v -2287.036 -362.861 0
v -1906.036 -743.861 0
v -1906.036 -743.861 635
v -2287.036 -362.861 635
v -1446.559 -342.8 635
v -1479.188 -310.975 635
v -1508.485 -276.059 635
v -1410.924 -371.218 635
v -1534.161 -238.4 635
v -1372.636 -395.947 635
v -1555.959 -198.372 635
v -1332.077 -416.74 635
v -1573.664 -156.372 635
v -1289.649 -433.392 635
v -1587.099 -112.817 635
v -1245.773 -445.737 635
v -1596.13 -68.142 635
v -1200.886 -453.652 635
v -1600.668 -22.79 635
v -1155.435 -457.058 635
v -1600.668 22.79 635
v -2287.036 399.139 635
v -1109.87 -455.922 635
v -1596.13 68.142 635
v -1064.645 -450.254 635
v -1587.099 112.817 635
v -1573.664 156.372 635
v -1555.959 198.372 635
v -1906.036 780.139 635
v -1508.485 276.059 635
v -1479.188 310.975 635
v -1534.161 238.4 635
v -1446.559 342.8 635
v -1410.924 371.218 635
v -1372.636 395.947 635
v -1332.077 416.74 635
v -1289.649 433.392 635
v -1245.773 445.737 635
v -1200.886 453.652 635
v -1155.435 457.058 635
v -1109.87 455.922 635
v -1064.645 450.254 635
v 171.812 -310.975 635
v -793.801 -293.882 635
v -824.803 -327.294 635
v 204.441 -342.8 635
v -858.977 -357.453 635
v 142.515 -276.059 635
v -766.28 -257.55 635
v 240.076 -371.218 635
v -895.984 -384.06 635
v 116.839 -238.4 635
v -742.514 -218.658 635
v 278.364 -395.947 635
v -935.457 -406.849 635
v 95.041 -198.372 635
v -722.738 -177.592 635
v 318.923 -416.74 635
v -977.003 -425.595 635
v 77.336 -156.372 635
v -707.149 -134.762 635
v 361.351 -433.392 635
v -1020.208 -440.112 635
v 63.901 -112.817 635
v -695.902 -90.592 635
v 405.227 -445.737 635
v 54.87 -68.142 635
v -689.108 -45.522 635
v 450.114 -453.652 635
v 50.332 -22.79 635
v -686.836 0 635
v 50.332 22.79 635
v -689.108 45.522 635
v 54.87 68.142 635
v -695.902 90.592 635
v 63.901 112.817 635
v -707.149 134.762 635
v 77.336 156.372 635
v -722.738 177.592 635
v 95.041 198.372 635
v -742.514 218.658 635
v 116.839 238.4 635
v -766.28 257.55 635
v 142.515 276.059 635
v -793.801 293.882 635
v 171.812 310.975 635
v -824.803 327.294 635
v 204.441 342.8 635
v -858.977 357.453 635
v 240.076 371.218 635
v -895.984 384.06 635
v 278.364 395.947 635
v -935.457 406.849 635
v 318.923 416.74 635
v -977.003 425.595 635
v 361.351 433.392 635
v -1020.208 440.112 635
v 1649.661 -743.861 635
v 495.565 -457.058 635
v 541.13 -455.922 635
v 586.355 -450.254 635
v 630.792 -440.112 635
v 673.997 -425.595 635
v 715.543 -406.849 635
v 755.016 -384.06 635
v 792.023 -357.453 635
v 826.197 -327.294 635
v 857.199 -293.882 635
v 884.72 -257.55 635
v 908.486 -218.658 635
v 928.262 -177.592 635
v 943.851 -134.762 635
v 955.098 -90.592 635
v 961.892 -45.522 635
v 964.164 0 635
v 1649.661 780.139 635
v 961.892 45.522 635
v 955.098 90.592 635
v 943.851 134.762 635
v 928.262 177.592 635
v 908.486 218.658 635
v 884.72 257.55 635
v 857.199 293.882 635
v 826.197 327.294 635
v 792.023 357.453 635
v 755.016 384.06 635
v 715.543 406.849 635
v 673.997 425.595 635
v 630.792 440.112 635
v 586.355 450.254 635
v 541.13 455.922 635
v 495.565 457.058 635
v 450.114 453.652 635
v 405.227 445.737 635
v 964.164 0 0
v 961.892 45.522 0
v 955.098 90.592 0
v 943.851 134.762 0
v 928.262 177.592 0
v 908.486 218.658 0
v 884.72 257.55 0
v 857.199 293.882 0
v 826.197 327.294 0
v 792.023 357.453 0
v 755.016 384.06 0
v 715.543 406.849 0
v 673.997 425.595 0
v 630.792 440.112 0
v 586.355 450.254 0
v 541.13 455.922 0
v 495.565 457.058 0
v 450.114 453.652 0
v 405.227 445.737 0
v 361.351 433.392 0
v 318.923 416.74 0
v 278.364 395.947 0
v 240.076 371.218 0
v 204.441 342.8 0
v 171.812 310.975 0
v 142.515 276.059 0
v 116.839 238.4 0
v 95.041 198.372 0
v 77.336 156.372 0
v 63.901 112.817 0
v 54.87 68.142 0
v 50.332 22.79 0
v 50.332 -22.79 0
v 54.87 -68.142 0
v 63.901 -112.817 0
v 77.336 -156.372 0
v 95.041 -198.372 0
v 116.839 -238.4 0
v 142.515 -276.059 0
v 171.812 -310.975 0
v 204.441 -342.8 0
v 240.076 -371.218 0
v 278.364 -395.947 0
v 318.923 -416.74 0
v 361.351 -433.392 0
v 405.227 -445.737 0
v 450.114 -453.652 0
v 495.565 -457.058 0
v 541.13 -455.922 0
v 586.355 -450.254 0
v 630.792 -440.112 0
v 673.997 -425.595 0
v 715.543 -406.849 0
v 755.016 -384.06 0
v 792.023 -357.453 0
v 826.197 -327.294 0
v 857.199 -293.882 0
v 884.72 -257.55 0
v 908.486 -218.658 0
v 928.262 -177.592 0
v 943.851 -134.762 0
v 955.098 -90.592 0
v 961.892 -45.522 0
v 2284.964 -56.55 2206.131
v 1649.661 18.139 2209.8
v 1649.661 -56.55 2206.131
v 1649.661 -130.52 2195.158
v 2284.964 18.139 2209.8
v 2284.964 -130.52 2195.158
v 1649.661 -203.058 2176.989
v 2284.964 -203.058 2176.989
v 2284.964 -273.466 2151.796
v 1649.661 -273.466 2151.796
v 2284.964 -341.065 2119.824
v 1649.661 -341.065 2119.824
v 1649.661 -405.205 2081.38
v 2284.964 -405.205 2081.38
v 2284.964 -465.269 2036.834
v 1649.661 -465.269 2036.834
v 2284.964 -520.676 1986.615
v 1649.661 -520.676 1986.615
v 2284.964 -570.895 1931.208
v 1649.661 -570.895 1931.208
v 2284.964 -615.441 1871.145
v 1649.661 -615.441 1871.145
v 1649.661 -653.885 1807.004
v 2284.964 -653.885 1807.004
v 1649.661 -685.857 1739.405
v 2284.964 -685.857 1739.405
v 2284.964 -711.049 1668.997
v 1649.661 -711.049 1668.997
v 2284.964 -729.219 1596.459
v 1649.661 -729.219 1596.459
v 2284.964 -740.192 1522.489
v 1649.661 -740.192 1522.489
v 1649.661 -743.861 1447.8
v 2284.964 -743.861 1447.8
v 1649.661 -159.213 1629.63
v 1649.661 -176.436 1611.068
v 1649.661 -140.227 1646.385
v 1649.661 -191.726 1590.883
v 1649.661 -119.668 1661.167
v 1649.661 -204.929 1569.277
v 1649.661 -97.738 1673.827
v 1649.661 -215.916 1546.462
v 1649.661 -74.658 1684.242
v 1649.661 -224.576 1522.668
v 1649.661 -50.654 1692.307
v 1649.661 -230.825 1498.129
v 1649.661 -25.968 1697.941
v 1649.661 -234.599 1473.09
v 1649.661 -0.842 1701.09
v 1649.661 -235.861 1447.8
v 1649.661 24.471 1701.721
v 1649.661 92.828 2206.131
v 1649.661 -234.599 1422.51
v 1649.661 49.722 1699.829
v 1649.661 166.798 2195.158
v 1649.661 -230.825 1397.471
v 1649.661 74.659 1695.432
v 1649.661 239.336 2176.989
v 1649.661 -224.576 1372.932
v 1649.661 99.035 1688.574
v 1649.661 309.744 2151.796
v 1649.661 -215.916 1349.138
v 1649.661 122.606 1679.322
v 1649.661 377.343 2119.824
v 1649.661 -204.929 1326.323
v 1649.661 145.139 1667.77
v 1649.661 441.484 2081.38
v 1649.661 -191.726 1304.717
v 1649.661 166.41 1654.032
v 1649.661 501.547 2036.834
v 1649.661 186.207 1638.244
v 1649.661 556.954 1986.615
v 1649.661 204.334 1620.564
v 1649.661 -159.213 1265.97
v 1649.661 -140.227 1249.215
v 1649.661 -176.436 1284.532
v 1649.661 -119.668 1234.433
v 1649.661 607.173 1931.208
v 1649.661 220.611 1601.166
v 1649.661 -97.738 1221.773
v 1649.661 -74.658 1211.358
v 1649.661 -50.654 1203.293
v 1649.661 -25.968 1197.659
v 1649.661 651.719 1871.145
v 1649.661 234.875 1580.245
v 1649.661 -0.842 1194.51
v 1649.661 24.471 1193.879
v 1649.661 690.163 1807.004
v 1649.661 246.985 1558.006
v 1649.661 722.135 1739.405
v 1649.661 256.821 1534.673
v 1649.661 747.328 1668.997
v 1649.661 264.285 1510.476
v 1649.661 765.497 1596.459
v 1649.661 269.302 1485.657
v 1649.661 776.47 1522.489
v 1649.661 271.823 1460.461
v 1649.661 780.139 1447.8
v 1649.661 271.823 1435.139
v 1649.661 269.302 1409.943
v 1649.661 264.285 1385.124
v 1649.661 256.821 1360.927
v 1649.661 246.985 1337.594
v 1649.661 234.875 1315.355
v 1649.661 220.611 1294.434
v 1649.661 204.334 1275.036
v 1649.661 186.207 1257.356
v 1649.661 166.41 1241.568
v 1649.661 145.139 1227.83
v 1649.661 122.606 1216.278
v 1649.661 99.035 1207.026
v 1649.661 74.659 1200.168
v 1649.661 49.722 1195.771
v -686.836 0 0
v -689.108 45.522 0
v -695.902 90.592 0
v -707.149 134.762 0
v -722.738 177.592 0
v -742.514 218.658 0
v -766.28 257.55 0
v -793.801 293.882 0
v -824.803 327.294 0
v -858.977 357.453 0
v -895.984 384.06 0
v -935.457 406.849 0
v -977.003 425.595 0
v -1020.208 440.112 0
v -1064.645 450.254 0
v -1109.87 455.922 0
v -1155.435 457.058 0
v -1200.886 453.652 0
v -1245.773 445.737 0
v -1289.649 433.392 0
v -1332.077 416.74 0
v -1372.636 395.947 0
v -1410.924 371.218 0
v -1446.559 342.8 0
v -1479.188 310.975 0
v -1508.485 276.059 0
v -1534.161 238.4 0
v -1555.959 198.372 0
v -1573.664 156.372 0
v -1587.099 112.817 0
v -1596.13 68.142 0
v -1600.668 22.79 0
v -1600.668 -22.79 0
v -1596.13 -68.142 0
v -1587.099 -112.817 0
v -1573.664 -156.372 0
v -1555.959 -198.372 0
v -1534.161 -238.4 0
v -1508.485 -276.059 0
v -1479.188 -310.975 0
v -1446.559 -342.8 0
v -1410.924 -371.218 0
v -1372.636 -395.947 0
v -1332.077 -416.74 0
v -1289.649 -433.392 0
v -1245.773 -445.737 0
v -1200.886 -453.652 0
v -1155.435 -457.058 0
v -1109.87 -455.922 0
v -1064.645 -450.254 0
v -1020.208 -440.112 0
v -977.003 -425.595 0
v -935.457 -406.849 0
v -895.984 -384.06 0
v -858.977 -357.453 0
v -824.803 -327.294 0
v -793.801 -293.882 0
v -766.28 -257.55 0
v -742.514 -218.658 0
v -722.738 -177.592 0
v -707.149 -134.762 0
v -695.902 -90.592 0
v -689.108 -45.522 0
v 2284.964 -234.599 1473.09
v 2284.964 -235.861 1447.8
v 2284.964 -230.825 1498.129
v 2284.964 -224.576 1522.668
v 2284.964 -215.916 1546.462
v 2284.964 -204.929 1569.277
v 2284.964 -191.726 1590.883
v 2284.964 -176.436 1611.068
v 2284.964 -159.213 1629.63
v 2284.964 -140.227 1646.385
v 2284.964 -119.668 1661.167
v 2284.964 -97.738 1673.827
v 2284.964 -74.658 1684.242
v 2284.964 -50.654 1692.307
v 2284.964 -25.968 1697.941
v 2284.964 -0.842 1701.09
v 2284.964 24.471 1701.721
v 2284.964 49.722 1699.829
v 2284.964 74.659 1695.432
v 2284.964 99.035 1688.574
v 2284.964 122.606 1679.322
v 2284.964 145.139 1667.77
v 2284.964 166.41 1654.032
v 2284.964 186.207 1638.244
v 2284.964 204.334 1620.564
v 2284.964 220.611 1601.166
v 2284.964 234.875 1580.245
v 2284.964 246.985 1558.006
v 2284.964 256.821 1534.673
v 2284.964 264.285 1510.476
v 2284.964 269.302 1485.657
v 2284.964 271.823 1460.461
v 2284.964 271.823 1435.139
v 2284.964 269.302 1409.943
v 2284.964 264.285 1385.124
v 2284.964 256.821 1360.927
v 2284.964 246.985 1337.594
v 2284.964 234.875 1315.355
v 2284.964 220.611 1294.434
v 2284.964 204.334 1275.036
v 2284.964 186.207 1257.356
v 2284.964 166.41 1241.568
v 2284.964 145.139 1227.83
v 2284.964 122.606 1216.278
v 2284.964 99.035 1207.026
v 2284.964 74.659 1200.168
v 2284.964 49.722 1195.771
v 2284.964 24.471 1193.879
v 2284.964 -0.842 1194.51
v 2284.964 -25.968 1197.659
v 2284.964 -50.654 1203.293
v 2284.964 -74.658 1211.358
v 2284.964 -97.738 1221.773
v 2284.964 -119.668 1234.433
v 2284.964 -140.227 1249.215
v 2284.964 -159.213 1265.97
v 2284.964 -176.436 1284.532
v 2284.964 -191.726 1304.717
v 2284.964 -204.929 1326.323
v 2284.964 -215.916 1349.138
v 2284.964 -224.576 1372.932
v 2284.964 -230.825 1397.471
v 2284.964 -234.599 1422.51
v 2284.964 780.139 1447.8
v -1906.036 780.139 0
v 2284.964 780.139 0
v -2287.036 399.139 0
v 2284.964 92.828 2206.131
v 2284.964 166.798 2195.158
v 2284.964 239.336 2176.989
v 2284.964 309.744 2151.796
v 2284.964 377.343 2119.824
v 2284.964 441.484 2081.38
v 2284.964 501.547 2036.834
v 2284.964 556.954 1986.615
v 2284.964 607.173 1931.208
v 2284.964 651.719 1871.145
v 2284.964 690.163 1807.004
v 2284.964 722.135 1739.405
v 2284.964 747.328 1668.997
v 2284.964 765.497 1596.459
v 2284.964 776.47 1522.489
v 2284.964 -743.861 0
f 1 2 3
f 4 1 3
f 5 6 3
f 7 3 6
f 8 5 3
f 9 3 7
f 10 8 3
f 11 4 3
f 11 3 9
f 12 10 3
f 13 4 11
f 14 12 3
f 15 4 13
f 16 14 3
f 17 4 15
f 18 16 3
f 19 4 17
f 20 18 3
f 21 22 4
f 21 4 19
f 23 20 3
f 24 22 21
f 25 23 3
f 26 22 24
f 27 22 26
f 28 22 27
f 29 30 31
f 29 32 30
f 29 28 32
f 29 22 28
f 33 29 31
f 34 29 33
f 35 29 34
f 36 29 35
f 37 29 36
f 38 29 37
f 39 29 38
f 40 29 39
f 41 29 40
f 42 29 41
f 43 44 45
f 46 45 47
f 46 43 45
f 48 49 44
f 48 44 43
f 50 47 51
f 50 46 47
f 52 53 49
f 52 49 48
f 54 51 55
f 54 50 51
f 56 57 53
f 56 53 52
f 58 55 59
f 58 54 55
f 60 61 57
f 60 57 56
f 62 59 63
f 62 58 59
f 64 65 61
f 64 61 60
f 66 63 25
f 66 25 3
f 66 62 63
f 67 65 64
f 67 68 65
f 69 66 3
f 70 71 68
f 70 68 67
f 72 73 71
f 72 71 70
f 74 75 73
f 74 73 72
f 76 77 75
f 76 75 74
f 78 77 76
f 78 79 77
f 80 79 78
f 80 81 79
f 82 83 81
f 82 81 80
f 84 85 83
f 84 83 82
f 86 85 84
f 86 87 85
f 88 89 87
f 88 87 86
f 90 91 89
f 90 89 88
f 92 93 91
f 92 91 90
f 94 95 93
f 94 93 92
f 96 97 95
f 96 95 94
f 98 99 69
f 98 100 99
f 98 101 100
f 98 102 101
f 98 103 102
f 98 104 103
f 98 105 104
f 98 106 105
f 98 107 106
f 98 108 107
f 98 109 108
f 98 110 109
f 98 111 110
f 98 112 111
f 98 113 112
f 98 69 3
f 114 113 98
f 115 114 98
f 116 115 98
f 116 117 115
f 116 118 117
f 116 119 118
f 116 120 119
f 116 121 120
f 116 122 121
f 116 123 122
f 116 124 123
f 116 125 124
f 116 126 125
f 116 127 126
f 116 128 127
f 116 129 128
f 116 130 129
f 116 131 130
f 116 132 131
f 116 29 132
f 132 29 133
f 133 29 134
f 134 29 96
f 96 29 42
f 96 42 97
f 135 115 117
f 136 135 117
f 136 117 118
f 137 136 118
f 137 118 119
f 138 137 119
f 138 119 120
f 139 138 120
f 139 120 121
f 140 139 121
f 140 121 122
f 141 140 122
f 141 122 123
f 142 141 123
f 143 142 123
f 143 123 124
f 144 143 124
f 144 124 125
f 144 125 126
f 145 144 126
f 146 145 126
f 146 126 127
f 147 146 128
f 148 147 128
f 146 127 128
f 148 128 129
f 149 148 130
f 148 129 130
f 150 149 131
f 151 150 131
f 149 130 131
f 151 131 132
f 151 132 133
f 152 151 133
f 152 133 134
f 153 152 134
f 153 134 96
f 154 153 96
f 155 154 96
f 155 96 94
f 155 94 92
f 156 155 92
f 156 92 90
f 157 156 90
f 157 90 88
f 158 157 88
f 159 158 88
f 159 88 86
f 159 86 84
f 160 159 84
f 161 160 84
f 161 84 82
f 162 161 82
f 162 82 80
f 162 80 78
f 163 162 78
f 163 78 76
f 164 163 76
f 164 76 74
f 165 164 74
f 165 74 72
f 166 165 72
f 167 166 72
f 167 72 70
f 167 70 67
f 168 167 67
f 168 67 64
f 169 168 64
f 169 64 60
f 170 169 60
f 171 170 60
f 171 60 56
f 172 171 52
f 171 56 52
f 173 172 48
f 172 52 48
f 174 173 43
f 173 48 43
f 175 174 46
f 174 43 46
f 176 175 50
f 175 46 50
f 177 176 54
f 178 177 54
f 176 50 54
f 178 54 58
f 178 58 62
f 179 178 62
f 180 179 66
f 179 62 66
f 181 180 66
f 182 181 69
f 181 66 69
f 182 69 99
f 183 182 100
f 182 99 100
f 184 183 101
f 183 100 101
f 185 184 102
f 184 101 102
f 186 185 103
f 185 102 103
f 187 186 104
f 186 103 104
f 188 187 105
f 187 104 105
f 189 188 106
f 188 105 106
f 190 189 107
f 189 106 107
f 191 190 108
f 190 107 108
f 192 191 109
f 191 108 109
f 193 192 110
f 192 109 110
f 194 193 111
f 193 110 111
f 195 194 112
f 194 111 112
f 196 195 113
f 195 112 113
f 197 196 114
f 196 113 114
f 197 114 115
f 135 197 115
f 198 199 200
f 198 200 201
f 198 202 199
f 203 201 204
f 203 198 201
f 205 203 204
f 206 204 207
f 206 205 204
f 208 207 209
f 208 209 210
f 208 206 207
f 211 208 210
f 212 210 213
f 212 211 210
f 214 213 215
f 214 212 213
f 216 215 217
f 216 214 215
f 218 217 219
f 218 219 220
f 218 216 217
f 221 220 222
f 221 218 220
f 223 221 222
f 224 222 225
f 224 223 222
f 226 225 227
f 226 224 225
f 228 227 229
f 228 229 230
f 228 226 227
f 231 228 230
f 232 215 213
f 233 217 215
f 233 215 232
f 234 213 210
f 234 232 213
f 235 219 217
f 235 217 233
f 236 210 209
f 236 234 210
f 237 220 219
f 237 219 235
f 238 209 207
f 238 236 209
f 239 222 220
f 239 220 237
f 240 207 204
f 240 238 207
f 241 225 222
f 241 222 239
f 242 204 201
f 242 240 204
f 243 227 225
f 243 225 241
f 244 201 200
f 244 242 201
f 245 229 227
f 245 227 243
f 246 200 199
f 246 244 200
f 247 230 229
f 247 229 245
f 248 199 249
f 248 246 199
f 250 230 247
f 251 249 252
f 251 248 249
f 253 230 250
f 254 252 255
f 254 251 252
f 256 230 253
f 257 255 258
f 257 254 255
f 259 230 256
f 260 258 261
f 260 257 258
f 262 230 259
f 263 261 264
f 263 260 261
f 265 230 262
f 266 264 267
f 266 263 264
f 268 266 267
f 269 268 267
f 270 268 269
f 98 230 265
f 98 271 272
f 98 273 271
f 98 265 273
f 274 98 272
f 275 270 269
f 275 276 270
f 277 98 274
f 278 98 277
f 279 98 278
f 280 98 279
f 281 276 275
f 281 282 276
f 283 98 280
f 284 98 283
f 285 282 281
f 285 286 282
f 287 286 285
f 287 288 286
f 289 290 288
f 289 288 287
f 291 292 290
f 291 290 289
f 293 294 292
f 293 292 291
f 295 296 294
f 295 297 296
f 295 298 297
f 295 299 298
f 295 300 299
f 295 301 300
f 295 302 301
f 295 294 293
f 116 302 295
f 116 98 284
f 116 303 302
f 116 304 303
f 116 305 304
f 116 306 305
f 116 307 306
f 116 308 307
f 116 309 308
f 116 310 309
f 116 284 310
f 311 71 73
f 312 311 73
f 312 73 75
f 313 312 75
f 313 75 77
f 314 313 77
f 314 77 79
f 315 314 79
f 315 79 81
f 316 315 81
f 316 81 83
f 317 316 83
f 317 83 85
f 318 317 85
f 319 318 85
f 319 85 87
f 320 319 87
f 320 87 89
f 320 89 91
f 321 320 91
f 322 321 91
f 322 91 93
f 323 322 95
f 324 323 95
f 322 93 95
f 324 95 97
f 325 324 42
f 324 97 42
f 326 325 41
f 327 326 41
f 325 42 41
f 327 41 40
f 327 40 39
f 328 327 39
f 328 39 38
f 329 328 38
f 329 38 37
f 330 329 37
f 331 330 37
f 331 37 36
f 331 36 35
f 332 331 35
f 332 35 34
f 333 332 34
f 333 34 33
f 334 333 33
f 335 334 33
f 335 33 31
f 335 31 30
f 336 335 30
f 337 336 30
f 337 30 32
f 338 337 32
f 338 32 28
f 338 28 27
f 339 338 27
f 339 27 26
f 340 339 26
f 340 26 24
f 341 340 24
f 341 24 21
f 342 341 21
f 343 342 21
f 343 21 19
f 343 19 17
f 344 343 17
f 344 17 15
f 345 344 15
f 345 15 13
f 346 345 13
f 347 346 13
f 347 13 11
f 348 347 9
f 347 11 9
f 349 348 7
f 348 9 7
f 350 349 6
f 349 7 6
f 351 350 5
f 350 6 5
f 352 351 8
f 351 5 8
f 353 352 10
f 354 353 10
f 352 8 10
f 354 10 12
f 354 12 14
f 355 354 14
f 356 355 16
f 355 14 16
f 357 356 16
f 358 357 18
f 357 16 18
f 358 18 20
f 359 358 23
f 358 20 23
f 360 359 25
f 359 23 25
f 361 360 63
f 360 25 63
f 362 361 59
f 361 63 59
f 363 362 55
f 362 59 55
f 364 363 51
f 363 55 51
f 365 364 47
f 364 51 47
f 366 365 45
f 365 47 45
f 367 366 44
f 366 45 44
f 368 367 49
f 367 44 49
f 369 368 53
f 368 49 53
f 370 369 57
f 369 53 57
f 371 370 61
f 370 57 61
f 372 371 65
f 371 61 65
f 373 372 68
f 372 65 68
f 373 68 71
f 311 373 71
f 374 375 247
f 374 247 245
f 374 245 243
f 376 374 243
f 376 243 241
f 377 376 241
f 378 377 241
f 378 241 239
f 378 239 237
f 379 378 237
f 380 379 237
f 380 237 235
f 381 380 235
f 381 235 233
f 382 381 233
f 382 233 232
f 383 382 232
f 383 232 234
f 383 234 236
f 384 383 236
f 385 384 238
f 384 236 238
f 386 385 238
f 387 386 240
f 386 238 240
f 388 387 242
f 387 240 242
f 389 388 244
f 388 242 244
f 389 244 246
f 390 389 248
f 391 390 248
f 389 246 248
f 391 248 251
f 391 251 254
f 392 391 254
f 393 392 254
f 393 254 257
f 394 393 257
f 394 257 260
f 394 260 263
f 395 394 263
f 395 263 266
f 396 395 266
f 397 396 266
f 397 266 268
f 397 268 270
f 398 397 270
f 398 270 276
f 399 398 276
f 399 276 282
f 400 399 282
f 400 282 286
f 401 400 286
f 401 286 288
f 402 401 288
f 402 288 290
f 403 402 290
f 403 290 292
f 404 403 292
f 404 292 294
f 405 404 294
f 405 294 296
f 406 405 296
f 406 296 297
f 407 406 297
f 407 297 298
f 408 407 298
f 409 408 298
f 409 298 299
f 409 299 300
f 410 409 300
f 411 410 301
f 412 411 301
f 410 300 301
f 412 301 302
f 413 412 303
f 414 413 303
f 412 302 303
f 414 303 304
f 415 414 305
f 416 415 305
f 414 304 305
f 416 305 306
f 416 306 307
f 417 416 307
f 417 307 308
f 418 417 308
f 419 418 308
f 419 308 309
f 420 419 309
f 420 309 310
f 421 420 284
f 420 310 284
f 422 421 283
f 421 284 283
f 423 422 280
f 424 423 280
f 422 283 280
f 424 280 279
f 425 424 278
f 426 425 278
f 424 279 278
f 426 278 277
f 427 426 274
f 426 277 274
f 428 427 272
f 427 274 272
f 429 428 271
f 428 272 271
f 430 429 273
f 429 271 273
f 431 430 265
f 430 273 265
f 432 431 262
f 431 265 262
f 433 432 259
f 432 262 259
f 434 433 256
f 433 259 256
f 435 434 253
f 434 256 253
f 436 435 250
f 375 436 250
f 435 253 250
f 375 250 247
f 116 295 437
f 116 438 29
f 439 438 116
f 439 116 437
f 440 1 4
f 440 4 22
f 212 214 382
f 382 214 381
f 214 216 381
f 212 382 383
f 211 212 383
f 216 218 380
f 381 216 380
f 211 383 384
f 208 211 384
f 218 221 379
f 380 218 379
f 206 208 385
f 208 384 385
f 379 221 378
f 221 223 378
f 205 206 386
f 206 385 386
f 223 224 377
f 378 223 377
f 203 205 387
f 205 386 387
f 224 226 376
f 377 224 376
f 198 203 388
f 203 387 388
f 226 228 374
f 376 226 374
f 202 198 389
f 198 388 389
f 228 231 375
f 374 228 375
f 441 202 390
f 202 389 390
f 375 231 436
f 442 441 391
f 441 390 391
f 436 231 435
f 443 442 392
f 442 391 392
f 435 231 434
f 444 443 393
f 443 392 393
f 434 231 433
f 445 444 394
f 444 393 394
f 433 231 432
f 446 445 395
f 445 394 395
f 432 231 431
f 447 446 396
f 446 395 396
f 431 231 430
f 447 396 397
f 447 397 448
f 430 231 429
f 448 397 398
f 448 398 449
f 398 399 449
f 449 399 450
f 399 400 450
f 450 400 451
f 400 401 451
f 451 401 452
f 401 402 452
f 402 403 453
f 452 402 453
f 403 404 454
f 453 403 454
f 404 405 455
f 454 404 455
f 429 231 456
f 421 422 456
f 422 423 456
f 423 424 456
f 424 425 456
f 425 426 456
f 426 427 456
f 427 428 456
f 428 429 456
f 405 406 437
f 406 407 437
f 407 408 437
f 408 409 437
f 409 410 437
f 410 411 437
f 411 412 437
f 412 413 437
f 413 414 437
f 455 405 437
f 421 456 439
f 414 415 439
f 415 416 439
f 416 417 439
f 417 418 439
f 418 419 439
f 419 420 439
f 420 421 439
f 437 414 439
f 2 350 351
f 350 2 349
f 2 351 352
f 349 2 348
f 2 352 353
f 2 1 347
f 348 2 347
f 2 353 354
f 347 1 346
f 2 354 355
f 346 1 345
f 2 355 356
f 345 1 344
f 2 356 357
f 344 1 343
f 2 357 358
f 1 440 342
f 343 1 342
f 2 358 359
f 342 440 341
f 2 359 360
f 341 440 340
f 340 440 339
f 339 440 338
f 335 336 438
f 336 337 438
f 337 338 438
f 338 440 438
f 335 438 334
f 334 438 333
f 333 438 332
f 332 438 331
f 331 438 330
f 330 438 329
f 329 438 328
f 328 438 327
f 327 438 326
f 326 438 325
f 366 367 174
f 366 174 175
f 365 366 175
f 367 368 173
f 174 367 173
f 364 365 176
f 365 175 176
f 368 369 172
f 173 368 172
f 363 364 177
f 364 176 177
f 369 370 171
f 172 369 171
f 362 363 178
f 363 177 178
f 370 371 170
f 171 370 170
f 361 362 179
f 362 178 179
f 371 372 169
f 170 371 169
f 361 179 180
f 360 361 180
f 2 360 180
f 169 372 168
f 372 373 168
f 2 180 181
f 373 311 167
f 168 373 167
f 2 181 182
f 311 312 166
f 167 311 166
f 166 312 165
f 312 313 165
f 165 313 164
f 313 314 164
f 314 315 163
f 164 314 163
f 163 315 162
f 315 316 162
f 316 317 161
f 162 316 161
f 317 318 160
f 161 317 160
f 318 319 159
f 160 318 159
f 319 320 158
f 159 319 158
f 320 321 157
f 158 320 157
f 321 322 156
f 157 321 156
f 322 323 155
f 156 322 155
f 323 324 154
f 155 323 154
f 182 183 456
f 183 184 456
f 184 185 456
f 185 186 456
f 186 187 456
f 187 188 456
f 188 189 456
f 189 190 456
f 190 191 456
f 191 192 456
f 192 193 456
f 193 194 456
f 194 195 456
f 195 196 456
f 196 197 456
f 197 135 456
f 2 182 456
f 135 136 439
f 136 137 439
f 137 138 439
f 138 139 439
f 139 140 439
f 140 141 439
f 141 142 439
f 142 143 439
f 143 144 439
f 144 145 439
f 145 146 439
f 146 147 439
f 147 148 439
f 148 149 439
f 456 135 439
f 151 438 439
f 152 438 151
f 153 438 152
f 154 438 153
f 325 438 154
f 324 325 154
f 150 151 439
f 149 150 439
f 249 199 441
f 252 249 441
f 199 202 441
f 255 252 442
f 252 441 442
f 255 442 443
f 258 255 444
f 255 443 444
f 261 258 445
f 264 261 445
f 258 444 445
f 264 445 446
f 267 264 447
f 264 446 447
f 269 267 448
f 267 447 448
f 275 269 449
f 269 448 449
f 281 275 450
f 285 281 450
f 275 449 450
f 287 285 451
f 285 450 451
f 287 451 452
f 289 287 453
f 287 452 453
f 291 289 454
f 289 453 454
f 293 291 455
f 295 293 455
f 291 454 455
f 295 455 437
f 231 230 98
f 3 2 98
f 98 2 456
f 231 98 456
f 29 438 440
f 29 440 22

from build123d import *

# Parameters (mm, degrees)
F0_W     = 4572
F0_H     = 1524
F1_DEPTH = 635
F2_W     = 635.3021987379
F2_H     = 1524
F3_DEPTH = 1574.8
F4_R     = 761.99999
F5_R     = 457.2
F6_DEPTH = 889
F7_R     = 254
F8_DEPTH = 635
F9_DEPTH = 25.4
F10_SIZE = 381


# Not quite as in the source:
# - a fillet or chamfer is up to 0.001 mm smaller than in the source, because OpenCascade refuses the exact size


with BuildPart() as f1:
    # F0 (on Top) → F1 (new body)
    with BuildSketch(Plane.XY):
        with Locations((-1.0364986956, 18.1390648085)):
            Rectangle(F0_W, F0_H)
    extrude(amount=F1_DEPTH)

    # F2 (on face) → F3 (join)
    with BuildSketch(Plane.XY.offset(635)):
        with Locations((1967.3124019355, 18.1390648085)):
            Rectangle(F2_W, F2_H)
    extrude(amount=F3_DEPTH)

    # F4 (radius 762 in the source; OpenCascade refuses exactly that, so slightly less here)
    f4_edges = [f1.edges().sort_by_distance(p)[0] for p in [
        (1967.312402, 780.139065, 2209.8),
        (1967.312402, -743.860935, 2209.8),
    ]]
    fillet(f4_edges, radius=F4_R)

    # F5 (on face) → F6 (cut)
    with BuildSketch(Plane.XY.offset(635)):
        with Locations((-1144.0364986956, 0)):
            Circle(F5_R)
        with Locations((506.9635013044, 0)):
            Circle(F5_R)
    extrude(amount=-F6_DEPTH, mode=Mode.SUBTRACT)

    # F7 (on face) → F8 (cut)
    with BuildSketch(Plane(origin=(1649.6613025665, 0, 0), x_dir=(0, -1, 0), z_dir=(-1, 0, 0))):
        with Locations((-18.1390648085, 1447.8)):
            Circle(F7_R)
    extrude(amount=-F8_DEPTH, mode=Mode.SUBTRACT)

    # F9 (cut): a face of the model
    f9_faces = [f1.faces().sort_by_distance(p)[0] for p in [
        (2284.6613025665, 18.1390648085, 1447.8),
    ]]
    extrude(f9_faces, amount=-F9_DEPTH, mode=Mode.SUBTRACT)

    # F10
    f10_edges = [f1.edges().sort_by_distance(p)[0] for p in [
        (-2287.036499, -743.860935, 317.5),
        (-2287.036499, 780.139065, 317.5),
    ]]
    chamfer(f10_edges, length=F10_SIZE)


solid = f1.part
